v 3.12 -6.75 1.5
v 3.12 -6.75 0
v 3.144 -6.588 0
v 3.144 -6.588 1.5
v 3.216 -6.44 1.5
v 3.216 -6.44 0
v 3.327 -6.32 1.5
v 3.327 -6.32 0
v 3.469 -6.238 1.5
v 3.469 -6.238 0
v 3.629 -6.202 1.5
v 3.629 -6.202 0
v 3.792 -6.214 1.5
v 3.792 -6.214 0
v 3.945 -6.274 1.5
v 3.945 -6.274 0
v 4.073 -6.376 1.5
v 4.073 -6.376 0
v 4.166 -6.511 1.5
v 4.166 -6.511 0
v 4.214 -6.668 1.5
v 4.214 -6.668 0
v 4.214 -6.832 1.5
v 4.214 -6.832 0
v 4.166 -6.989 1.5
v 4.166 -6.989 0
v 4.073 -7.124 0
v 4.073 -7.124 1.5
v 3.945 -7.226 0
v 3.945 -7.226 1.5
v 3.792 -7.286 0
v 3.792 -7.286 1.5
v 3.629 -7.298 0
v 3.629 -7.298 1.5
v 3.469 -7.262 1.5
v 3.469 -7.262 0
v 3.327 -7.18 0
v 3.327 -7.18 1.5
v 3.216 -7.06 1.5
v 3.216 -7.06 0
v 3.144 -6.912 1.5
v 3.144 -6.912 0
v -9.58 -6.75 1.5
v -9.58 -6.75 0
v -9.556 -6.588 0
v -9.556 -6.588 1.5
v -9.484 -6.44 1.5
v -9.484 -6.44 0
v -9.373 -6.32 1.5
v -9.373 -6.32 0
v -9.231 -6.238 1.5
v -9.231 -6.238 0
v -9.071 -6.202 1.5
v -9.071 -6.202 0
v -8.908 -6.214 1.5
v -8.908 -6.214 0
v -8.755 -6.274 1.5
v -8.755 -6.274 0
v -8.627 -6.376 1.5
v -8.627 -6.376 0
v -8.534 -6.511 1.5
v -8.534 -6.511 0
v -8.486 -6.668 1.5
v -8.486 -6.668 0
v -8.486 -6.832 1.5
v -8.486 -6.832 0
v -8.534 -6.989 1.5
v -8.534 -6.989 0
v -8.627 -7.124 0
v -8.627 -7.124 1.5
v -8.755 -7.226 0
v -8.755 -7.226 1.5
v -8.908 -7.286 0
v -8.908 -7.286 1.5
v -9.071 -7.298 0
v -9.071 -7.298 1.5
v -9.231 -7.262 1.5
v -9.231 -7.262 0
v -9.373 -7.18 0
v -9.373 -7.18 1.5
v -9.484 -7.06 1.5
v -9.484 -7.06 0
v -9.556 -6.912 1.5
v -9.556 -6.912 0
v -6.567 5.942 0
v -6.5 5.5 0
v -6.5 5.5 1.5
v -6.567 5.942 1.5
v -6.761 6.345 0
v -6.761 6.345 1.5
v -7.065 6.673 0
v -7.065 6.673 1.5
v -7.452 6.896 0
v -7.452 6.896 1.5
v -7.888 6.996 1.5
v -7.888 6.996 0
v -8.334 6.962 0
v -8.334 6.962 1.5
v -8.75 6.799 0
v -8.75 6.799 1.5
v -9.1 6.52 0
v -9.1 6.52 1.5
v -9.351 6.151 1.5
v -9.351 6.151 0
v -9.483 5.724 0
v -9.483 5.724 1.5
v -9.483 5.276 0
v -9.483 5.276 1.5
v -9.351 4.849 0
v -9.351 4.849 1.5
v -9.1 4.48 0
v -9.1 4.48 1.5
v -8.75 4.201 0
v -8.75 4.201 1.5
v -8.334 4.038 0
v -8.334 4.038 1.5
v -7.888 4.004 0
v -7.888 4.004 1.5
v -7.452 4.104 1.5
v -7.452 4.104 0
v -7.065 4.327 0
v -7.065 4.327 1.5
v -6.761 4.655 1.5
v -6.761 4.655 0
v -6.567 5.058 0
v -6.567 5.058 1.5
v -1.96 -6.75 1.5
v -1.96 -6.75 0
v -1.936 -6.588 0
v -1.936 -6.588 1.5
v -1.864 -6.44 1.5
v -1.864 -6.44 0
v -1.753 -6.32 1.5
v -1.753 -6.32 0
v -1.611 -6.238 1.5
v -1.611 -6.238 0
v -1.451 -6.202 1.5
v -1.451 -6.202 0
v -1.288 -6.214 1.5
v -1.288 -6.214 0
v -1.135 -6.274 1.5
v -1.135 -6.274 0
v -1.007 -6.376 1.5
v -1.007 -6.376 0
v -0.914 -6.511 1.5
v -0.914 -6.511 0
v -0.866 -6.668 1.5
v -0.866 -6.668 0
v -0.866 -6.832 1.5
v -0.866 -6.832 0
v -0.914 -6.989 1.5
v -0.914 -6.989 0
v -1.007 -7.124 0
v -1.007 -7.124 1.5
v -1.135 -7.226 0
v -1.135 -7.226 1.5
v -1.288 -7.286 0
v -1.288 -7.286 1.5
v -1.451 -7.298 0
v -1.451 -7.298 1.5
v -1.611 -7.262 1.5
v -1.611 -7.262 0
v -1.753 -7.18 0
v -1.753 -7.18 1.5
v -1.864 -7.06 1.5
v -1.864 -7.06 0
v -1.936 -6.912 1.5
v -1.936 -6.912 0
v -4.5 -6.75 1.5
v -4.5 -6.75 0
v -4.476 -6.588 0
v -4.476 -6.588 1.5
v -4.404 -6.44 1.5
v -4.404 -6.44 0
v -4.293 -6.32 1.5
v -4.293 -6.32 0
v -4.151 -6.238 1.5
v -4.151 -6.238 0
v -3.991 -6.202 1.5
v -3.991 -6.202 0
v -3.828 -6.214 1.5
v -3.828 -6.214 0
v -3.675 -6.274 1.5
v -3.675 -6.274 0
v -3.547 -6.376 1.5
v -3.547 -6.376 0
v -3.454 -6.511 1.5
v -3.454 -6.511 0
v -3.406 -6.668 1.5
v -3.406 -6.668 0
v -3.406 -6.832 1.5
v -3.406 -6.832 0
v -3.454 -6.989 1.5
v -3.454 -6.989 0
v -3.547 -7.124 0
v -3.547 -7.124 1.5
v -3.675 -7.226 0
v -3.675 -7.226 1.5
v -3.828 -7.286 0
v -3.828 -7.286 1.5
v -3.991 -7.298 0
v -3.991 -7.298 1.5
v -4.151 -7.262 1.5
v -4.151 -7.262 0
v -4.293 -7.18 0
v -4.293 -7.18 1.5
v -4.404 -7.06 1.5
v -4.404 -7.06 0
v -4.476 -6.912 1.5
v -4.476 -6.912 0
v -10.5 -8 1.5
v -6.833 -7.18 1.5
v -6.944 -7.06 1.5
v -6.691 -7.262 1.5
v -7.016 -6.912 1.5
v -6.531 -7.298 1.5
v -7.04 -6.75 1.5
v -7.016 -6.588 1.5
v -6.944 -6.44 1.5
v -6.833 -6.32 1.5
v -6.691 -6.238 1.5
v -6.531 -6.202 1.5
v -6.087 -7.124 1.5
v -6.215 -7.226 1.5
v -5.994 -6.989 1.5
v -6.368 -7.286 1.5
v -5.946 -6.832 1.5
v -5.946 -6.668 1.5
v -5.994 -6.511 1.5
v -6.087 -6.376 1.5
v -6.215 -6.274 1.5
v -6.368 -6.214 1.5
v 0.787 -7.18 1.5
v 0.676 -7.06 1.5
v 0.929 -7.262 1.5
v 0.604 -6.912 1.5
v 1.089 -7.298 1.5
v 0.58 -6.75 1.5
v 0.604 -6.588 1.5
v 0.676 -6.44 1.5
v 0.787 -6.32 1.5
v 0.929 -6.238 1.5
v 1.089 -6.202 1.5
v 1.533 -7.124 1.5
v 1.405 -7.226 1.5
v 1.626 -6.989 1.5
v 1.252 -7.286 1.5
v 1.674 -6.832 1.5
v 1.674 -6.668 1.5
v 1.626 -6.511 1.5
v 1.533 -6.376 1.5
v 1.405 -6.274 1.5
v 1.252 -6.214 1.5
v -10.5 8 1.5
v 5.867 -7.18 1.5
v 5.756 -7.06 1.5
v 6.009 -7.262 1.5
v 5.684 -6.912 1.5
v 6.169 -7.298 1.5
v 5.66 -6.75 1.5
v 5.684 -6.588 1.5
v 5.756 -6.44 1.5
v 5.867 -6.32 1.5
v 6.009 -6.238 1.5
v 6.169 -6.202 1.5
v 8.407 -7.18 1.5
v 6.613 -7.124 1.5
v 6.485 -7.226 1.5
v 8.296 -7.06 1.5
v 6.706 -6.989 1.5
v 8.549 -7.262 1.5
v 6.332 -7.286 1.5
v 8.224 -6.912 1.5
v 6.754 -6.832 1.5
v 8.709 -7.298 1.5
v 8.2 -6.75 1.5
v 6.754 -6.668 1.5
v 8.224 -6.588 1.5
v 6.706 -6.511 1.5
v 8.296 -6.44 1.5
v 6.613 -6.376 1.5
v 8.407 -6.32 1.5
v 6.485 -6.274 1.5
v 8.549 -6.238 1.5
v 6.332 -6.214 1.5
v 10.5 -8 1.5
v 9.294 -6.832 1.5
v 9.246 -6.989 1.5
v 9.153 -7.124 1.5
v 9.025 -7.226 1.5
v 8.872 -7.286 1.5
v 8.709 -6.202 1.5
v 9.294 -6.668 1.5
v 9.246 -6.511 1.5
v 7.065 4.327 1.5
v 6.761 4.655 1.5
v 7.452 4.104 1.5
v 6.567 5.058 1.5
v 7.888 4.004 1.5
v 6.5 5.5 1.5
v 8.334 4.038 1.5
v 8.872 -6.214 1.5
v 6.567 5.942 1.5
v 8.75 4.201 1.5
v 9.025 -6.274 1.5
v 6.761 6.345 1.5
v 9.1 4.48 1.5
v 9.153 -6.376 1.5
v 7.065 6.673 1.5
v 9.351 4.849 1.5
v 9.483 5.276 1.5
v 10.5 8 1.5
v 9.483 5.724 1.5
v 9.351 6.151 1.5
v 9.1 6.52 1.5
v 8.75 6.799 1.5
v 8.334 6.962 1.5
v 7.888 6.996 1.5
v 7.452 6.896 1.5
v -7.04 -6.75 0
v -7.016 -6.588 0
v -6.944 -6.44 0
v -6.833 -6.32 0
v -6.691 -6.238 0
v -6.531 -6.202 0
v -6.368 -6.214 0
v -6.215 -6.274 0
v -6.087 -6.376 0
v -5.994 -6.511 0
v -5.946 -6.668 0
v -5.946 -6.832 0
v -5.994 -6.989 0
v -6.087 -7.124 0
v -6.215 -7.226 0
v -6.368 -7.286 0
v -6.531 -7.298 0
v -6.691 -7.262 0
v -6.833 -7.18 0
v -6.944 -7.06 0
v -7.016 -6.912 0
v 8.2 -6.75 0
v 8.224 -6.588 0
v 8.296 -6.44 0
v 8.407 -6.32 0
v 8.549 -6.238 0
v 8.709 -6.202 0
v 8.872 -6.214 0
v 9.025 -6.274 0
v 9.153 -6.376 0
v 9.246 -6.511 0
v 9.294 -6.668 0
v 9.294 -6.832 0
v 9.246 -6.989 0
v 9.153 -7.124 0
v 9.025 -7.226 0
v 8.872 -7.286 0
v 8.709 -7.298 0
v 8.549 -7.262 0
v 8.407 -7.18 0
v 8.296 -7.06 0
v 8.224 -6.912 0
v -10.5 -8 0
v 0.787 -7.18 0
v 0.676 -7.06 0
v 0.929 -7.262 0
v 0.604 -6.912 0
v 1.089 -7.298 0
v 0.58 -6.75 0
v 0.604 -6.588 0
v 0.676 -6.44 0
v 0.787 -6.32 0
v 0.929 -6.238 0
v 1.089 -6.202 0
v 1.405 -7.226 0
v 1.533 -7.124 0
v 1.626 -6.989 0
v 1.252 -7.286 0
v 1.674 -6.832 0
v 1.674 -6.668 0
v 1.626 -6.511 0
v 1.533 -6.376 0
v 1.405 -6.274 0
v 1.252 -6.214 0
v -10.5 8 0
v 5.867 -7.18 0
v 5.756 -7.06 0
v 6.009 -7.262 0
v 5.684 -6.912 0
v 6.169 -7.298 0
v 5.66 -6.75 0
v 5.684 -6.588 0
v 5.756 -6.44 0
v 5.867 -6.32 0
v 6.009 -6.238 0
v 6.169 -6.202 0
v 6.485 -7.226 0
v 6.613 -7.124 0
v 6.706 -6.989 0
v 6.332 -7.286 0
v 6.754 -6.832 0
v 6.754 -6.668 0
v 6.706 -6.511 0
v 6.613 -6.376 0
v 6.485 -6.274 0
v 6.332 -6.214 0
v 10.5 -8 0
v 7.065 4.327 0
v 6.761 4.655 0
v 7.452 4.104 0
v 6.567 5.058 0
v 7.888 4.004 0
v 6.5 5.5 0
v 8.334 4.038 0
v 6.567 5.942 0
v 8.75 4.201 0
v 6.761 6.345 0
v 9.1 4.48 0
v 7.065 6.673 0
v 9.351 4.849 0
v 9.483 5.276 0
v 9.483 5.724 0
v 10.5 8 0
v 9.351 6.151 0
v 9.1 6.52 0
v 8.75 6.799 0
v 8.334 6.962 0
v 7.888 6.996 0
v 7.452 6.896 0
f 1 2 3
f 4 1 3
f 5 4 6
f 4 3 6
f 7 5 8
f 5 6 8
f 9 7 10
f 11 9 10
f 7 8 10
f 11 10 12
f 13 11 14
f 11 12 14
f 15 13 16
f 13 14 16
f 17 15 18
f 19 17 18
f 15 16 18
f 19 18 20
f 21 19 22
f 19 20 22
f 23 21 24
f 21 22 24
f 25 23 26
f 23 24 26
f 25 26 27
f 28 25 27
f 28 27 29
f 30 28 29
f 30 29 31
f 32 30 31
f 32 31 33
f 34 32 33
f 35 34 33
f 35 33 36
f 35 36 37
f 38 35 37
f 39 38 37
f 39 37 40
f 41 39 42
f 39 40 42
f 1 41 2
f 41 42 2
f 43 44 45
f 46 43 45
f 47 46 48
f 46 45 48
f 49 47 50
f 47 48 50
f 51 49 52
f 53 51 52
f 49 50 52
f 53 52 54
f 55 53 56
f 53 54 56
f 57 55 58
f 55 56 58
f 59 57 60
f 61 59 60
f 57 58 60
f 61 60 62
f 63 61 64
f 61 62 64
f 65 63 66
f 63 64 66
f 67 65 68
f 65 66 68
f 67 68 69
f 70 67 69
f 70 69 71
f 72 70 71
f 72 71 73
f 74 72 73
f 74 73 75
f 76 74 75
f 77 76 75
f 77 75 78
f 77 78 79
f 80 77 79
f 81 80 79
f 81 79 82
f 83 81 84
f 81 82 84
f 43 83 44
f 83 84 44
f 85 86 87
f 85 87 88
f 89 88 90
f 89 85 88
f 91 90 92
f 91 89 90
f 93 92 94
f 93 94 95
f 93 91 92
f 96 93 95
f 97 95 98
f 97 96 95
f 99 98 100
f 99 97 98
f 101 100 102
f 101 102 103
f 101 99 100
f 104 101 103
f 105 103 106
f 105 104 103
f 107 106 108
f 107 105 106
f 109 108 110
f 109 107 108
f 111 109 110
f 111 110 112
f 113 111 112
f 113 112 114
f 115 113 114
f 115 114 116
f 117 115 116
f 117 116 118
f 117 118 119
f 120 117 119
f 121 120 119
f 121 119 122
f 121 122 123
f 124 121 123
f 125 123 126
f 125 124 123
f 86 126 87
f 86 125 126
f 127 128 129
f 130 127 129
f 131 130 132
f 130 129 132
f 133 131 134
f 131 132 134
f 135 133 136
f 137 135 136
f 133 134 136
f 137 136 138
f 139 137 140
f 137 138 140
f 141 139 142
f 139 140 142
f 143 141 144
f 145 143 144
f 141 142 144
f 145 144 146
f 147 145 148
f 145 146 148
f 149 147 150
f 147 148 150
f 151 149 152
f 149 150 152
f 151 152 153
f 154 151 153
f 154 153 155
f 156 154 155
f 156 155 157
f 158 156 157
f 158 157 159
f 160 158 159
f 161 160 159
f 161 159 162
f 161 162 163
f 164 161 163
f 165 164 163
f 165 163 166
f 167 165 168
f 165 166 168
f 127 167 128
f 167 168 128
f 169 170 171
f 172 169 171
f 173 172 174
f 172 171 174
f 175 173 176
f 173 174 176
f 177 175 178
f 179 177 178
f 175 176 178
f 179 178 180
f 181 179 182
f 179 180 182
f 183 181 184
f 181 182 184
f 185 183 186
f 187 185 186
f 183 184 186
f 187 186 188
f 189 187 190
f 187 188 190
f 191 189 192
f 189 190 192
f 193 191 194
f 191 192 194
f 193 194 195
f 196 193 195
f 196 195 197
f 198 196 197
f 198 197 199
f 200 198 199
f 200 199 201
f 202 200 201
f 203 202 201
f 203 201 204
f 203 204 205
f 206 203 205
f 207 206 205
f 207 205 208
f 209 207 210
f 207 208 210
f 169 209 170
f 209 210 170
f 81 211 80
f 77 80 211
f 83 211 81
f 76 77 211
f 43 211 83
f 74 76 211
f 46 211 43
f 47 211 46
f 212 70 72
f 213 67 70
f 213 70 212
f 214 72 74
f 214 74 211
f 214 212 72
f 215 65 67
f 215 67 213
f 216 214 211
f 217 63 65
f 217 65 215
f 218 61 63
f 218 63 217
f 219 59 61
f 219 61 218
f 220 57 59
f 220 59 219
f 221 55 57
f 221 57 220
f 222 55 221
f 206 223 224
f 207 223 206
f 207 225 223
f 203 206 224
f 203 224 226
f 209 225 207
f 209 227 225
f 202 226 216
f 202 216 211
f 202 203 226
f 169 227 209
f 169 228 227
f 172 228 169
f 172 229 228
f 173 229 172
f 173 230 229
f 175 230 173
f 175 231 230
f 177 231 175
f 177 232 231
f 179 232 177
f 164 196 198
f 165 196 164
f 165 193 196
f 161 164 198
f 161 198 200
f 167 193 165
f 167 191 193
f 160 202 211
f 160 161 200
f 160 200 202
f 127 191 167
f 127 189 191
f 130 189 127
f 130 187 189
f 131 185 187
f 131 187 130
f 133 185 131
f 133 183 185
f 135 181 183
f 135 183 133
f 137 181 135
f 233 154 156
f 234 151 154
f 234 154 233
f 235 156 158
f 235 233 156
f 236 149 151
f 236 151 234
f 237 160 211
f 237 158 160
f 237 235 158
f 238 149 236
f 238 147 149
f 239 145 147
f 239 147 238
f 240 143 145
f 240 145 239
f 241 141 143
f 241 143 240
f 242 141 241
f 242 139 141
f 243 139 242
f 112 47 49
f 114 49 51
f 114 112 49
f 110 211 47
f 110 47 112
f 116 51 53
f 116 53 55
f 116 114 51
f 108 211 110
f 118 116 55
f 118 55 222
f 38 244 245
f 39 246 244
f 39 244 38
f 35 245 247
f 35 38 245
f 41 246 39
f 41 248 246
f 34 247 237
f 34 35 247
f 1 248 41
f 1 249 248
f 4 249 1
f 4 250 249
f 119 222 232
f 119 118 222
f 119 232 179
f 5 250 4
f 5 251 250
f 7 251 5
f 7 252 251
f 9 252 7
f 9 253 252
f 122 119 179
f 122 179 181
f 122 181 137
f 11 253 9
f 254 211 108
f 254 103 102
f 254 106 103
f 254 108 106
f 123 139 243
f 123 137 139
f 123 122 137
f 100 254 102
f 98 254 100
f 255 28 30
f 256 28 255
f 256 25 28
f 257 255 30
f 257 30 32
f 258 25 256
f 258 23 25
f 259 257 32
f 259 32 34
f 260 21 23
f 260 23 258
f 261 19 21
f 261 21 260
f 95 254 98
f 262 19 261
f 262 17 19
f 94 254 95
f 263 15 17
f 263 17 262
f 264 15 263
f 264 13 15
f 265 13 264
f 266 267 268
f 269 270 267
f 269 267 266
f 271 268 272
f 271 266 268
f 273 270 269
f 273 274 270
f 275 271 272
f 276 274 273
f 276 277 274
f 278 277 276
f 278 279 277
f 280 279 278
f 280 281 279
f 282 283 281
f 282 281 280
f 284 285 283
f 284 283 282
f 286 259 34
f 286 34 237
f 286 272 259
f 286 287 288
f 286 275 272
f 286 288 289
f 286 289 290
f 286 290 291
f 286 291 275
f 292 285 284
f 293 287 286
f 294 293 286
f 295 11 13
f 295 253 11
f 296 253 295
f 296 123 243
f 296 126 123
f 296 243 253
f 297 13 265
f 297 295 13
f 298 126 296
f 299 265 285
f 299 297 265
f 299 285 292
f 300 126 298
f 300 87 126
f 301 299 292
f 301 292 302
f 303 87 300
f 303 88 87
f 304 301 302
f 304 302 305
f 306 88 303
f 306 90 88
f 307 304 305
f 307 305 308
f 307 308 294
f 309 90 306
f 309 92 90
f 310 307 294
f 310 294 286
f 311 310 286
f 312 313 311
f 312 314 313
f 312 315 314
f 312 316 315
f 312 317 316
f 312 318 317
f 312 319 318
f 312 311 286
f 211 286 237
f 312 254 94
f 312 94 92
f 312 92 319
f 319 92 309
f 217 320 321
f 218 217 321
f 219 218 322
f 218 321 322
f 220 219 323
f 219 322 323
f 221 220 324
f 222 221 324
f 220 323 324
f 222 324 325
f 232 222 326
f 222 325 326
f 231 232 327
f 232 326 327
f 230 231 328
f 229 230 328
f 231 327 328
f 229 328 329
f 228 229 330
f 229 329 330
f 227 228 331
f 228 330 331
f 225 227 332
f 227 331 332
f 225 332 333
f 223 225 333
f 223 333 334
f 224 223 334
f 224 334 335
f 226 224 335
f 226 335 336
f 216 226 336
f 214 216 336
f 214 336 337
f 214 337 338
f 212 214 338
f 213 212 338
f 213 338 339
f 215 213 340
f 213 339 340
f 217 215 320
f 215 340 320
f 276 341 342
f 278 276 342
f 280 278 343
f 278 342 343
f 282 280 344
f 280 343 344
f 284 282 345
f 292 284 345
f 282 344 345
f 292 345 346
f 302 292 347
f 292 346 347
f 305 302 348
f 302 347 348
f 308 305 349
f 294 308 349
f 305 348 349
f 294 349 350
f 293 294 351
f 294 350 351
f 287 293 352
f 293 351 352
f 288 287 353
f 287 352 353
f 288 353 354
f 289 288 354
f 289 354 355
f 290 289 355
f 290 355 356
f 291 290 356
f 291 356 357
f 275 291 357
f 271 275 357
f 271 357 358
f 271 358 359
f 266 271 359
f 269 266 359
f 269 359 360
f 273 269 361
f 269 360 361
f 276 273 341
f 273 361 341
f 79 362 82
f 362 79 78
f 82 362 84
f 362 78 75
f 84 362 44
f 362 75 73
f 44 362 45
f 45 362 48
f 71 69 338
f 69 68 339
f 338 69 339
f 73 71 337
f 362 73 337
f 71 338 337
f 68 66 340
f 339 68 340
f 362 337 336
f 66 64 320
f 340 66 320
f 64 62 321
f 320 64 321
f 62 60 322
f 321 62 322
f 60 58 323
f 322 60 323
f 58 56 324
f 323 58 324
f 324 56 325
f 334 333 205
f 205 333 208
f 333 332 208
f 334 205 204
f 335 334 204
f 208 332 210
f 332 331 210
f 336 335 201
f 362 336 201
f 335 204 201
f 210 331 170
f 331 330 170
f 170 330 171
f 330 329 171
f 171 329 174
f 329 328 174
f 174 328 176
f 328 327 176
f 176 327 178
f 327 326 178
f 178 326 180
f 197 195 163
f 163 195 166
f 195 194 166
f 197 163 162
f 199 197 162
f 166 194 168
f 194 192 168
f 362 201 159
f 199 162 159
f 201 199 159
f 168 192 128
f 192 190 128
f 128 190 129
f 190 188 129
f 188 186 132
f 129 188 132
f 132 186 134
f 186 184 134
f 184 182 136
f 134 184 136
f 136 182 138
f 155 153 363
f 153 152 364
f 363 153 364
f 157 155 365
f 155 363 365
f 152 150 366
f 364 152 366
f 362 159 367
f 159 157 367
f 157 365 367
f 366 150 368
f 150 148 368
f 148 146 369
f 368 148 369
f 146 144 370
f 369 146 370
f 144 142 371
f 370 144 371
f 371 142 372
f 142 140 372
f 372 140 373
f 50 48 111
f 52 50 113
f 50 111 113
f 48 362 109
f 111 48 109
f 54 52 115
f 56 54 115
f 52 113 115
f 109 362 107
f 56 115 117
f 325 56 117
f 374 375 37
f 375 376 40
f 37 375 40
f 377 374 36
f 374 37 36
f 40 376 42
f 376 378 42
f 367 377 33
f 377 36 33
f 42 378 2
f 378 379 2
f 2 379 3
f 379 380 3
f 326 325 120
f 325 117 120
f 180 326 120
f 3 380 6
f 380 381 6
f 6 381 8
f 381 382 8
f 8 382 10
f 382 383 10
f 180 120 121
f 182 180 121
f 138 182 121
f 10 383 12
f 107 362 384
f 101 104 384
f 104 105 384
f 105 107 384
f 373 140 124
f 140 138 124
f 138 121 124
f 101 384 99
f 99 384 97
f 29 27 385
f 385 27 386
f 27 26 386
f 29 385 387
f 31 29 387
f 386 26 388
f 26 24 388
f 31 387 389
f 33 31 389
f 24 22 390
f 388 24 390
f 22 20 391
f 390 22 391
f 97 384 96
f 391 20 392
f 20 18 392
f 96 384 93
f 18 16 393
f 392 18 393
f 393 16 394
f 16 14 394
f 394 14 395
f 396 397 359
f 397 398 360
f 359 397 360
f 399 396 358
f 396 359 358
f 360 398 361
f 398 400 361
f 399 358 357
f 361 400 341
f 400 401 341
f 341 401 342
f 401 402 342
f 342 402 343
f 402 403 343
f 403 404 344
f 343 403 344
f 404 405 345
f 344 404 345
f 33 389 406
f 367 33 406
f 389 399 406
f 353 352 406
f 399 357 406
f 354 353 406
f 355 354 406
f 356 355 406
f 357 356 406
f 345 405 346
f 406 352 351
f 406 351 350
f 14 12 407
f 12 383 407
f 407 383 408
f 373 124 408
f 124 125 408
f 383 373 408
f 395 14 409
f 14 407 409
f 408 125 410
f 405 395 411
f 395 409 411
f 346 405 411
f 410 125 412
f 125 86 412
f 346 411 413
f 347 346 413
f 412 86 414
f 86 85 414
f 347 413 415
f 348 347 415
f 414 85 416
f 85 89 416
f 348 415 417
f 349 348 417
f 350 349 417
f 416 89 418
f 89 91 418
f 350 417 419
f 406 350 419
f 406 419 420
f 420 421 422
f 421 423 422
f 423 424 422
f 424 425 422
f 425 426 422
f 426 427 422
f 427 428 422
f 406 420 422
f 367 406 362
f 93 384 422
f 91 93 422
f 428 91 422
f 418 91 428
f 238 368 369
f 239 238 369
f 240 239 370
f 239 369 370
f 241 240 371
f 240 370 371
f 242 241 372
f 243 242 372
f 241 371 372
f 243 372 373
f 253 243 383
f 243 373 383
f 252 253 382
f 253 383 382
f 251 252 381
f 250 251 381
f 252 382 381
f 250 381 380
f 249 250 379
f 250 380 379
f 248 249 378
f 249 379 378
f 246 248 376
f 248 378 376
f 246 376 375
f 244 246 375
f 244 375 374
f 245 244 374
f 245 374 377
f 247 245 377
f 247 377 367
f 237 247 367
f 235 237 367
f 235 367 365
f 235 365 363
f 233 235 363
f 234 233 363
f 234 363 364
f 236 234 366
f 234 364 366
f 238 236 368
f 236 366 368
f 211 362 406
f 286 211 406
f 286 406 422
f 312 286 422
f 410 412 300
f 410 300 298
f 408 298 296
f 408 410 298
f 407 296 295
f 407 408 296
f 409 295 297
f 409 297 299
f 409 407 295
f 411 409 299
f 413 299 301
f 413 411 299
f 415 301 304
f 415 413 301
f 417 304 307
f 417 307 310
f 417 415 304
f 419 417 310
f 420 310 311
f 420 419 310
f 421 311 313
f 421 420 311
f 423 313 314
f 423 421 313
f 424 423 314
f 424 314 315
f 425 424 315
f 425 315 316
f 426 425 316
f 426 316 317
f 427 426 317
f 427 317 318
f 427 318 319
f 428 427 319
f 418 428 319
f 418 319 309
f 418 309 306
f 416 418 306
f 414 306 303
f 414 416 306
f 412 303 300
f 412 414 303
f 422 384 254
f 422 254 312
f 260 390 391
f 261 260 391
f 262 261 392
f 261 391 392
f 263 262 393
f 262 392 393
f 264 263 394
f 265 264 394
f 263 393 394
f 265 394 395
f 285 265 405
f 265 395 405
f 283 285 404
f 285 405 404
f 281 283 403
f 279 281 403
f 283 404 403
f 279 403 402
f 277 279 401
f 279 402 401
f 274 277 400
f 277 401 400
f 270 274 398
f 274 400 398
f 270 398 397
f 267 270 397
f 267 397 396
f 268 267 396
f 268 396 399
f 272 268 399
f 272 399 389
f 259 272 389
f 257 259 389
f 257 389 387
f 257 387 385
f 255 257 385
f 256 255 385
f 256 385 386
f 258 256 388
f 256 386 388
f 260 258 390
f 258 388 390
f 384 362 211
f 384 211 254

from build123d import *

# Parameters (mm, degrees)
CROQUIS1_W              = 21
CROQUIS1_H              = 16
CROQUIS1_R              = 1.5
SALIENTE_EXTRUIR1_DEPTH = 1.5
CROQUIS2_R              = 0.55
CORTAR_EXTRUIR1_DEPTH   = 1.5


with BuildPart() as part:
    # Croquis1 → Saliente-Extruir1 (new body)
    with BuildSketch(Plane.XY):
        Rectangle(CROQUIS1_W, CROQUIS1_H)
        with Locations((-8, 5.5)):
            Circle(CROQUIS1_R, mode=Mode.SUBTRACT)
        with Locations(Location((8, 5.5, 0), (0, 0, 180))):
            Circle(CROQUIS1_R, mode=Mode.SUBTRACT)
    extrude(amount=SALIENTE_EXTRUIR1_DEPTH)

    # Croquis2 → Cortar-Extruir1 (cut)
    with BuildSketch(Plane(origin=(0, 0, 0), x_dir=(-1, 0, 0), z_dir=(0, 0, -1))):
        with Locations((-8.75, -6.75)):
            Circle(CROQUIS2_R)
        with Locations((-6.21, -6.75)):
            Circle(CROQUIS2_R)
        with Locations((-3.67, -6.75)):
            Circle(CROQUIS2_R)
        with Locations((-1.13, -6.75)):
            Circle(CROQUIS2_R)
        with Locations((1.41, -6.75)):
            Circle(CROQUIS2_R)
        with Locations((3.95, -6.75)):
            Circle(CROQUIS2_R)
        with Locations((6.49, -6.75)):
            Circle(CROQUIS2_R)
        with Locations((9.03, -6.75)):
            Circle(CROQUIS2_R)
    extrude(amount=-CORTAR_EXTRUIR1_DEPTH, mode=Mode.SUBTRACT)


solid = part.part
